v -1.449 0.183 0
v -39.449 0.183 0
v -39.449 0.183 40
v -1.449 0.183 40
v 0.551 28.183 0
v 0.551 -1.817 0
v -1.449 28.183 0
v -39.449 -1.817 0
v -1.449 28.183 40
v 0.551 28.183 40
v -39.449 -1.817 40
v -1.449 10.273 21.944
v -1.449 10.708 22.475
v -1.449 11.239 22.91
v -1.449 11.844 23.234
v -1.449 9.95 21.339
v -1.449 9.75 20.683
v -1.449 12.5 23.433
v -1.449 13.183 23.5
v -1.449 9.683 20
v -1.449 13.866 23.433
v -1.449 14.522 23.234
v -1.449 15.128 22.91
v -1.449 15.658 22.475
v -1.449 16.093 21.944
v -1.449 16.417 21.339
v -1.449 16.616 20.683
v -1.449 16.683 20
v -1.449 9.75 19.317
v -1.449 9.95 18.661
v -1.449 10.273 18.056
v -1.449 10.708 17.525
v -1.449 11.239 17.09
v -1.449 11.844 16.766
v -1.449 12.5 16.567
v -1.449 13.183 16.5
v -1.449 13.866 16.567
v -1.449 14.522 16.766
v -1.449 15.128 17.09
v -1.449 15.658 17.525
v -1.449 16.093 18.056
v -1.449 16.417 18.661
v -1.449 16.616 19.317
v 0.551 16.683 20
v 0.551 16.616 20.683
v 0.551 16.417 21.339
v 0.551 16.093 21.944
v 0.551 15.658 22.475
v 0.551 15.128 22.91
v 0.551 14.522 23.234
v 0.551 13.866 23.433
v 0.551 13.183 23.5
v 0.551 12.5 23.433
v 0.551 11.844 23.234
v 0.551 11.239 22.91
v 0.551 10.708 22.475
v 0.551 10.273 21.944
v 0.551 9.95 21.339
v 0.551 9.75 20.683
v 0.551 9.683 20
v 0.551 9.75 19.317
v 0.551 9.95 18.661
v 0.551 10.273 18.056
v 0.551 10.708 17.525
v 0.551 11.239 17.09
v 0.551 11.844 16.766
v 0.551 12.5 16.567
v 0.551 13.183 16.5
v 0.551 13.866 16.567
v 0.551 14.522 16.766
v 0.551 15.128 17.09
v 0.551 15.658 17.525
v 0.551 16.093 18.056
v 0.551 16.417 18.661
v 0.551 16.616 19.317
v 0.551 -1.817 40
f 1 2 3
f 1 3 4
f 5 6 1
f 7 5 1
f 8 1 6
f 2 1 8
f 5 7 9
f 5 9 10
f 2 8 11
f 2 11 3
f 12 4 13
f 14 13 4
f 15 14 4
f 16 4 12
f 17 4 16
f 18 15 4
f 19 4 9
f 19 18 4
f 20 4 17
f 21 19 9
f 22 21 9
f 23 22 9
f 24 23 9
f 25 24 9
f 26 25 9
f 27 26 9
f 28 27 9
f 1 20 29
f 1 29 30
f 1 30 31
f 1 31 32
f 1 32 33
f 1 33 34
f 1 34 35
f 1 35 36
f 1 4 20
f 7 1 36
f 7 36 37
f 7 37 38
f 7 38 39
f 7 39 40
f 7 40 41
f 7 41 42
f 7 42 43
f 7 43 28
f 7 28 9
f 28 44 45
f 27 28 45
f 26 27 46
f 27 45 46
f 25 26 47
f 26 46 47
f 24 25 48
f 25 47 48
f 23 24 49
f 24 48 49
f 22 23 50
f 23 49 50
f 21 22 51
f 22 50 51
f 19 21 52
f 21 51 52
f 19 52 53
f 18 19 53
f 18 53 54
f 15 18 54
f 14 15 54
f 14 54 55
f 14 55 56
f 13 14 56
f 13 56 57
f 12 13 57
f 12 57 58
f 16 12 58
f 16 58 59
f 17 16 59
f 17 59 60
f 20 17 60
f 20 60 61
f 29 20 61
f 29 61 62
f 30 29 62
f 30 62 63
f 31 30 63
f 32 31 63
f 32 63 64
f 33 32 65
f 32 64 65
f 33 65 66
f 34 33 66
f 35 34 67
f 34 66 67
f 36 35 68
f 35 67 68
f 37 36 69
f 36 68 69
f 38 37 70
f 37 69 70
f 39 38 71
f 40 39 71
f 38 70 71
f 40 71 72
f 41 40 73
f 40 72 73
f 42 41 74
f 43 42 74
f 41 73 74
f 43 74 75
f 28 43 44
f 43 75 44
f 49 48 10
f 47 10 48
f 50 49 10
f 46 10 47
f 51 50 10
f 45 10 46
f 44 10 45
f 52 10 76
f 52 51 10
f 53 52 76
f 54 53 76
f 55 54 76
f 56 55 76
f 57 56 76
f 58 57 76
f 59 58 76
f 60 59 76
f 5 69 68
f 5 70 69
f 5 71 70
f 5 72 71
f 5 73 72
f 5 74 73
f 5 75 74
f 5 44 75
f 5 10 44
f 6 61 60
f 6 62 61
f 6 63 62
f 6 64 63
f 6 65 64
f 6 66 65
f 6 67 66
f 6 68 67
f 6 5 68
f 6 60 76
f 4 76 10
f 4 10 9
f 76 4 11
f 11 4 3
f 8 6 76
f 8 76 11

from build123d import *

# Parameters (mm, degrees)
SALIENTE_EXTRUIR1_DEPTH = 40
CROQUIS2_R              = 3.5
CORTAR_EXTRUIR1_DEPTH   = 64.2003722


with BuildPart() as part:
    # Croquis1 → Saliente-Extruir1 (new body)
    with BuildSketch(Plane.XY):
        Polygon((0.551367026, 28.183098592), (0.551367026, -1.816901408), (-39.448632974, -1.816901408), (-39.448632974, 0.183098592), (-1.448632974, 0.183098592), (-1.448632974, 28.183098592), align=None)
    extrude(amount=SALIENTE_EXTRUIR1_DEPTH)

    # Croquis2 → Cortar-Extruir1 (cut, through all)
    with BuildSketch(Plane(origin=(0.551367026, 0, 0), x_dir=(0, 0, -1), z_dir=(1, 0, 0))):
        with Locations(Location((-20, 13.183098592, 0), (0, 0, 90))):
            Circle(CROQUIS2_R)
    extrude(amount=-CORTAR_EXTRUIR1_DEPTH, mode=Mode.SUBTRACT)


solid = part.part
